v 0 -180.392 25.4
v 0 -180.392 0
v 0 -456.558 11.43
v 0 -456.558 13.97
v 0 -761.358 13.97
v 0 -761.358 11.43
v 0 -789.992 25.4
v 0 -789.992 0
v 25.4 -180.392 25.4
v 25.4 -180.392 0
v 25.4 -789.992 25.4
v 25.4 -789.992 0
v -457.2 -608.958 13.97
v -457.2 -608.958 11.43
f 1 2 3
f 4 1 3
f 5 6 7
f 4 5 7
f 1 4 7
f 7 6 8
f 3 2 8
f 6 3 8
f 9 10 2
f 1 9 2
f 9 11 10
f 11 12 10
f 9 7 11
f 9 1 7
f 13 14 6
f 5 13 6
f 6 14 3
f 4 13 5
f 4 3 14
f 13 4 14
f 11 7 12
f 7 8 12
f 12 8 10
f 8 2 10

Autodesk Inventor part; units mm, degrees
ref_plane "YZ Plane" through (0, 0, 0) normal (1, 0, 0) x (0, 1, 0)
ref_plane "XZ Plane" through (0, 0, 0) normal (0, 1, 0) x (-1, 0, 0)
ref_plane "XY Plane" through (0, 0, 0) normal (0, 0, 1) x (1, 0, 0)
ref_plane "Work Plane1" through (0, 0, 0) normal (0, 0, 1) x (1, 0, 0)
sketch "Sketch1" plane through (0, 0, 0) normal (0, 0, 1) x (1, 0, 0)
  line L0 (0, -789.9925) -> (25.4, -789.9925)
  line L1 (25.4, -789.9925) -> (25.4, -180.3925)
  line L2 (25.4, -180.3925) -> (0, -180.3925)
  line L3 (0, -180.3925) -> (0, -789.9925)
  point P0 (0, 0)
  dimension "d0" = 25.4
  dimension "d1" = 609.6
extrude "Extrusion1" add sketch "Sketch1" along normal blind 25.4
ref_plane "Work Plane2" through (0, 0, 12.7) normal (0, 0, 1) x (1, 0, 0)
sketch "Sketch3" plane through (0, 0, 12.7) normal (0, 0, 1) x (1, 0, 0)
  line L0 (0, -180.3925) -> (0, -789.9925) projected
  line L1 (0, -761.3575) -> (0, -456.5575)
  line L2 (0, -456.5575) -> (-457.2, -608.9575)
  line L3 (-457.2, -608.9575) -> (0, -761.3575)
  point P0 (0, 0)
  dimension "d8" = 304.8
  dimension "d9" = 457.2
extrude "Extrusion2" add sketch "Sketch3" along normal mid plane 2.54
properties part number "flag holder"
